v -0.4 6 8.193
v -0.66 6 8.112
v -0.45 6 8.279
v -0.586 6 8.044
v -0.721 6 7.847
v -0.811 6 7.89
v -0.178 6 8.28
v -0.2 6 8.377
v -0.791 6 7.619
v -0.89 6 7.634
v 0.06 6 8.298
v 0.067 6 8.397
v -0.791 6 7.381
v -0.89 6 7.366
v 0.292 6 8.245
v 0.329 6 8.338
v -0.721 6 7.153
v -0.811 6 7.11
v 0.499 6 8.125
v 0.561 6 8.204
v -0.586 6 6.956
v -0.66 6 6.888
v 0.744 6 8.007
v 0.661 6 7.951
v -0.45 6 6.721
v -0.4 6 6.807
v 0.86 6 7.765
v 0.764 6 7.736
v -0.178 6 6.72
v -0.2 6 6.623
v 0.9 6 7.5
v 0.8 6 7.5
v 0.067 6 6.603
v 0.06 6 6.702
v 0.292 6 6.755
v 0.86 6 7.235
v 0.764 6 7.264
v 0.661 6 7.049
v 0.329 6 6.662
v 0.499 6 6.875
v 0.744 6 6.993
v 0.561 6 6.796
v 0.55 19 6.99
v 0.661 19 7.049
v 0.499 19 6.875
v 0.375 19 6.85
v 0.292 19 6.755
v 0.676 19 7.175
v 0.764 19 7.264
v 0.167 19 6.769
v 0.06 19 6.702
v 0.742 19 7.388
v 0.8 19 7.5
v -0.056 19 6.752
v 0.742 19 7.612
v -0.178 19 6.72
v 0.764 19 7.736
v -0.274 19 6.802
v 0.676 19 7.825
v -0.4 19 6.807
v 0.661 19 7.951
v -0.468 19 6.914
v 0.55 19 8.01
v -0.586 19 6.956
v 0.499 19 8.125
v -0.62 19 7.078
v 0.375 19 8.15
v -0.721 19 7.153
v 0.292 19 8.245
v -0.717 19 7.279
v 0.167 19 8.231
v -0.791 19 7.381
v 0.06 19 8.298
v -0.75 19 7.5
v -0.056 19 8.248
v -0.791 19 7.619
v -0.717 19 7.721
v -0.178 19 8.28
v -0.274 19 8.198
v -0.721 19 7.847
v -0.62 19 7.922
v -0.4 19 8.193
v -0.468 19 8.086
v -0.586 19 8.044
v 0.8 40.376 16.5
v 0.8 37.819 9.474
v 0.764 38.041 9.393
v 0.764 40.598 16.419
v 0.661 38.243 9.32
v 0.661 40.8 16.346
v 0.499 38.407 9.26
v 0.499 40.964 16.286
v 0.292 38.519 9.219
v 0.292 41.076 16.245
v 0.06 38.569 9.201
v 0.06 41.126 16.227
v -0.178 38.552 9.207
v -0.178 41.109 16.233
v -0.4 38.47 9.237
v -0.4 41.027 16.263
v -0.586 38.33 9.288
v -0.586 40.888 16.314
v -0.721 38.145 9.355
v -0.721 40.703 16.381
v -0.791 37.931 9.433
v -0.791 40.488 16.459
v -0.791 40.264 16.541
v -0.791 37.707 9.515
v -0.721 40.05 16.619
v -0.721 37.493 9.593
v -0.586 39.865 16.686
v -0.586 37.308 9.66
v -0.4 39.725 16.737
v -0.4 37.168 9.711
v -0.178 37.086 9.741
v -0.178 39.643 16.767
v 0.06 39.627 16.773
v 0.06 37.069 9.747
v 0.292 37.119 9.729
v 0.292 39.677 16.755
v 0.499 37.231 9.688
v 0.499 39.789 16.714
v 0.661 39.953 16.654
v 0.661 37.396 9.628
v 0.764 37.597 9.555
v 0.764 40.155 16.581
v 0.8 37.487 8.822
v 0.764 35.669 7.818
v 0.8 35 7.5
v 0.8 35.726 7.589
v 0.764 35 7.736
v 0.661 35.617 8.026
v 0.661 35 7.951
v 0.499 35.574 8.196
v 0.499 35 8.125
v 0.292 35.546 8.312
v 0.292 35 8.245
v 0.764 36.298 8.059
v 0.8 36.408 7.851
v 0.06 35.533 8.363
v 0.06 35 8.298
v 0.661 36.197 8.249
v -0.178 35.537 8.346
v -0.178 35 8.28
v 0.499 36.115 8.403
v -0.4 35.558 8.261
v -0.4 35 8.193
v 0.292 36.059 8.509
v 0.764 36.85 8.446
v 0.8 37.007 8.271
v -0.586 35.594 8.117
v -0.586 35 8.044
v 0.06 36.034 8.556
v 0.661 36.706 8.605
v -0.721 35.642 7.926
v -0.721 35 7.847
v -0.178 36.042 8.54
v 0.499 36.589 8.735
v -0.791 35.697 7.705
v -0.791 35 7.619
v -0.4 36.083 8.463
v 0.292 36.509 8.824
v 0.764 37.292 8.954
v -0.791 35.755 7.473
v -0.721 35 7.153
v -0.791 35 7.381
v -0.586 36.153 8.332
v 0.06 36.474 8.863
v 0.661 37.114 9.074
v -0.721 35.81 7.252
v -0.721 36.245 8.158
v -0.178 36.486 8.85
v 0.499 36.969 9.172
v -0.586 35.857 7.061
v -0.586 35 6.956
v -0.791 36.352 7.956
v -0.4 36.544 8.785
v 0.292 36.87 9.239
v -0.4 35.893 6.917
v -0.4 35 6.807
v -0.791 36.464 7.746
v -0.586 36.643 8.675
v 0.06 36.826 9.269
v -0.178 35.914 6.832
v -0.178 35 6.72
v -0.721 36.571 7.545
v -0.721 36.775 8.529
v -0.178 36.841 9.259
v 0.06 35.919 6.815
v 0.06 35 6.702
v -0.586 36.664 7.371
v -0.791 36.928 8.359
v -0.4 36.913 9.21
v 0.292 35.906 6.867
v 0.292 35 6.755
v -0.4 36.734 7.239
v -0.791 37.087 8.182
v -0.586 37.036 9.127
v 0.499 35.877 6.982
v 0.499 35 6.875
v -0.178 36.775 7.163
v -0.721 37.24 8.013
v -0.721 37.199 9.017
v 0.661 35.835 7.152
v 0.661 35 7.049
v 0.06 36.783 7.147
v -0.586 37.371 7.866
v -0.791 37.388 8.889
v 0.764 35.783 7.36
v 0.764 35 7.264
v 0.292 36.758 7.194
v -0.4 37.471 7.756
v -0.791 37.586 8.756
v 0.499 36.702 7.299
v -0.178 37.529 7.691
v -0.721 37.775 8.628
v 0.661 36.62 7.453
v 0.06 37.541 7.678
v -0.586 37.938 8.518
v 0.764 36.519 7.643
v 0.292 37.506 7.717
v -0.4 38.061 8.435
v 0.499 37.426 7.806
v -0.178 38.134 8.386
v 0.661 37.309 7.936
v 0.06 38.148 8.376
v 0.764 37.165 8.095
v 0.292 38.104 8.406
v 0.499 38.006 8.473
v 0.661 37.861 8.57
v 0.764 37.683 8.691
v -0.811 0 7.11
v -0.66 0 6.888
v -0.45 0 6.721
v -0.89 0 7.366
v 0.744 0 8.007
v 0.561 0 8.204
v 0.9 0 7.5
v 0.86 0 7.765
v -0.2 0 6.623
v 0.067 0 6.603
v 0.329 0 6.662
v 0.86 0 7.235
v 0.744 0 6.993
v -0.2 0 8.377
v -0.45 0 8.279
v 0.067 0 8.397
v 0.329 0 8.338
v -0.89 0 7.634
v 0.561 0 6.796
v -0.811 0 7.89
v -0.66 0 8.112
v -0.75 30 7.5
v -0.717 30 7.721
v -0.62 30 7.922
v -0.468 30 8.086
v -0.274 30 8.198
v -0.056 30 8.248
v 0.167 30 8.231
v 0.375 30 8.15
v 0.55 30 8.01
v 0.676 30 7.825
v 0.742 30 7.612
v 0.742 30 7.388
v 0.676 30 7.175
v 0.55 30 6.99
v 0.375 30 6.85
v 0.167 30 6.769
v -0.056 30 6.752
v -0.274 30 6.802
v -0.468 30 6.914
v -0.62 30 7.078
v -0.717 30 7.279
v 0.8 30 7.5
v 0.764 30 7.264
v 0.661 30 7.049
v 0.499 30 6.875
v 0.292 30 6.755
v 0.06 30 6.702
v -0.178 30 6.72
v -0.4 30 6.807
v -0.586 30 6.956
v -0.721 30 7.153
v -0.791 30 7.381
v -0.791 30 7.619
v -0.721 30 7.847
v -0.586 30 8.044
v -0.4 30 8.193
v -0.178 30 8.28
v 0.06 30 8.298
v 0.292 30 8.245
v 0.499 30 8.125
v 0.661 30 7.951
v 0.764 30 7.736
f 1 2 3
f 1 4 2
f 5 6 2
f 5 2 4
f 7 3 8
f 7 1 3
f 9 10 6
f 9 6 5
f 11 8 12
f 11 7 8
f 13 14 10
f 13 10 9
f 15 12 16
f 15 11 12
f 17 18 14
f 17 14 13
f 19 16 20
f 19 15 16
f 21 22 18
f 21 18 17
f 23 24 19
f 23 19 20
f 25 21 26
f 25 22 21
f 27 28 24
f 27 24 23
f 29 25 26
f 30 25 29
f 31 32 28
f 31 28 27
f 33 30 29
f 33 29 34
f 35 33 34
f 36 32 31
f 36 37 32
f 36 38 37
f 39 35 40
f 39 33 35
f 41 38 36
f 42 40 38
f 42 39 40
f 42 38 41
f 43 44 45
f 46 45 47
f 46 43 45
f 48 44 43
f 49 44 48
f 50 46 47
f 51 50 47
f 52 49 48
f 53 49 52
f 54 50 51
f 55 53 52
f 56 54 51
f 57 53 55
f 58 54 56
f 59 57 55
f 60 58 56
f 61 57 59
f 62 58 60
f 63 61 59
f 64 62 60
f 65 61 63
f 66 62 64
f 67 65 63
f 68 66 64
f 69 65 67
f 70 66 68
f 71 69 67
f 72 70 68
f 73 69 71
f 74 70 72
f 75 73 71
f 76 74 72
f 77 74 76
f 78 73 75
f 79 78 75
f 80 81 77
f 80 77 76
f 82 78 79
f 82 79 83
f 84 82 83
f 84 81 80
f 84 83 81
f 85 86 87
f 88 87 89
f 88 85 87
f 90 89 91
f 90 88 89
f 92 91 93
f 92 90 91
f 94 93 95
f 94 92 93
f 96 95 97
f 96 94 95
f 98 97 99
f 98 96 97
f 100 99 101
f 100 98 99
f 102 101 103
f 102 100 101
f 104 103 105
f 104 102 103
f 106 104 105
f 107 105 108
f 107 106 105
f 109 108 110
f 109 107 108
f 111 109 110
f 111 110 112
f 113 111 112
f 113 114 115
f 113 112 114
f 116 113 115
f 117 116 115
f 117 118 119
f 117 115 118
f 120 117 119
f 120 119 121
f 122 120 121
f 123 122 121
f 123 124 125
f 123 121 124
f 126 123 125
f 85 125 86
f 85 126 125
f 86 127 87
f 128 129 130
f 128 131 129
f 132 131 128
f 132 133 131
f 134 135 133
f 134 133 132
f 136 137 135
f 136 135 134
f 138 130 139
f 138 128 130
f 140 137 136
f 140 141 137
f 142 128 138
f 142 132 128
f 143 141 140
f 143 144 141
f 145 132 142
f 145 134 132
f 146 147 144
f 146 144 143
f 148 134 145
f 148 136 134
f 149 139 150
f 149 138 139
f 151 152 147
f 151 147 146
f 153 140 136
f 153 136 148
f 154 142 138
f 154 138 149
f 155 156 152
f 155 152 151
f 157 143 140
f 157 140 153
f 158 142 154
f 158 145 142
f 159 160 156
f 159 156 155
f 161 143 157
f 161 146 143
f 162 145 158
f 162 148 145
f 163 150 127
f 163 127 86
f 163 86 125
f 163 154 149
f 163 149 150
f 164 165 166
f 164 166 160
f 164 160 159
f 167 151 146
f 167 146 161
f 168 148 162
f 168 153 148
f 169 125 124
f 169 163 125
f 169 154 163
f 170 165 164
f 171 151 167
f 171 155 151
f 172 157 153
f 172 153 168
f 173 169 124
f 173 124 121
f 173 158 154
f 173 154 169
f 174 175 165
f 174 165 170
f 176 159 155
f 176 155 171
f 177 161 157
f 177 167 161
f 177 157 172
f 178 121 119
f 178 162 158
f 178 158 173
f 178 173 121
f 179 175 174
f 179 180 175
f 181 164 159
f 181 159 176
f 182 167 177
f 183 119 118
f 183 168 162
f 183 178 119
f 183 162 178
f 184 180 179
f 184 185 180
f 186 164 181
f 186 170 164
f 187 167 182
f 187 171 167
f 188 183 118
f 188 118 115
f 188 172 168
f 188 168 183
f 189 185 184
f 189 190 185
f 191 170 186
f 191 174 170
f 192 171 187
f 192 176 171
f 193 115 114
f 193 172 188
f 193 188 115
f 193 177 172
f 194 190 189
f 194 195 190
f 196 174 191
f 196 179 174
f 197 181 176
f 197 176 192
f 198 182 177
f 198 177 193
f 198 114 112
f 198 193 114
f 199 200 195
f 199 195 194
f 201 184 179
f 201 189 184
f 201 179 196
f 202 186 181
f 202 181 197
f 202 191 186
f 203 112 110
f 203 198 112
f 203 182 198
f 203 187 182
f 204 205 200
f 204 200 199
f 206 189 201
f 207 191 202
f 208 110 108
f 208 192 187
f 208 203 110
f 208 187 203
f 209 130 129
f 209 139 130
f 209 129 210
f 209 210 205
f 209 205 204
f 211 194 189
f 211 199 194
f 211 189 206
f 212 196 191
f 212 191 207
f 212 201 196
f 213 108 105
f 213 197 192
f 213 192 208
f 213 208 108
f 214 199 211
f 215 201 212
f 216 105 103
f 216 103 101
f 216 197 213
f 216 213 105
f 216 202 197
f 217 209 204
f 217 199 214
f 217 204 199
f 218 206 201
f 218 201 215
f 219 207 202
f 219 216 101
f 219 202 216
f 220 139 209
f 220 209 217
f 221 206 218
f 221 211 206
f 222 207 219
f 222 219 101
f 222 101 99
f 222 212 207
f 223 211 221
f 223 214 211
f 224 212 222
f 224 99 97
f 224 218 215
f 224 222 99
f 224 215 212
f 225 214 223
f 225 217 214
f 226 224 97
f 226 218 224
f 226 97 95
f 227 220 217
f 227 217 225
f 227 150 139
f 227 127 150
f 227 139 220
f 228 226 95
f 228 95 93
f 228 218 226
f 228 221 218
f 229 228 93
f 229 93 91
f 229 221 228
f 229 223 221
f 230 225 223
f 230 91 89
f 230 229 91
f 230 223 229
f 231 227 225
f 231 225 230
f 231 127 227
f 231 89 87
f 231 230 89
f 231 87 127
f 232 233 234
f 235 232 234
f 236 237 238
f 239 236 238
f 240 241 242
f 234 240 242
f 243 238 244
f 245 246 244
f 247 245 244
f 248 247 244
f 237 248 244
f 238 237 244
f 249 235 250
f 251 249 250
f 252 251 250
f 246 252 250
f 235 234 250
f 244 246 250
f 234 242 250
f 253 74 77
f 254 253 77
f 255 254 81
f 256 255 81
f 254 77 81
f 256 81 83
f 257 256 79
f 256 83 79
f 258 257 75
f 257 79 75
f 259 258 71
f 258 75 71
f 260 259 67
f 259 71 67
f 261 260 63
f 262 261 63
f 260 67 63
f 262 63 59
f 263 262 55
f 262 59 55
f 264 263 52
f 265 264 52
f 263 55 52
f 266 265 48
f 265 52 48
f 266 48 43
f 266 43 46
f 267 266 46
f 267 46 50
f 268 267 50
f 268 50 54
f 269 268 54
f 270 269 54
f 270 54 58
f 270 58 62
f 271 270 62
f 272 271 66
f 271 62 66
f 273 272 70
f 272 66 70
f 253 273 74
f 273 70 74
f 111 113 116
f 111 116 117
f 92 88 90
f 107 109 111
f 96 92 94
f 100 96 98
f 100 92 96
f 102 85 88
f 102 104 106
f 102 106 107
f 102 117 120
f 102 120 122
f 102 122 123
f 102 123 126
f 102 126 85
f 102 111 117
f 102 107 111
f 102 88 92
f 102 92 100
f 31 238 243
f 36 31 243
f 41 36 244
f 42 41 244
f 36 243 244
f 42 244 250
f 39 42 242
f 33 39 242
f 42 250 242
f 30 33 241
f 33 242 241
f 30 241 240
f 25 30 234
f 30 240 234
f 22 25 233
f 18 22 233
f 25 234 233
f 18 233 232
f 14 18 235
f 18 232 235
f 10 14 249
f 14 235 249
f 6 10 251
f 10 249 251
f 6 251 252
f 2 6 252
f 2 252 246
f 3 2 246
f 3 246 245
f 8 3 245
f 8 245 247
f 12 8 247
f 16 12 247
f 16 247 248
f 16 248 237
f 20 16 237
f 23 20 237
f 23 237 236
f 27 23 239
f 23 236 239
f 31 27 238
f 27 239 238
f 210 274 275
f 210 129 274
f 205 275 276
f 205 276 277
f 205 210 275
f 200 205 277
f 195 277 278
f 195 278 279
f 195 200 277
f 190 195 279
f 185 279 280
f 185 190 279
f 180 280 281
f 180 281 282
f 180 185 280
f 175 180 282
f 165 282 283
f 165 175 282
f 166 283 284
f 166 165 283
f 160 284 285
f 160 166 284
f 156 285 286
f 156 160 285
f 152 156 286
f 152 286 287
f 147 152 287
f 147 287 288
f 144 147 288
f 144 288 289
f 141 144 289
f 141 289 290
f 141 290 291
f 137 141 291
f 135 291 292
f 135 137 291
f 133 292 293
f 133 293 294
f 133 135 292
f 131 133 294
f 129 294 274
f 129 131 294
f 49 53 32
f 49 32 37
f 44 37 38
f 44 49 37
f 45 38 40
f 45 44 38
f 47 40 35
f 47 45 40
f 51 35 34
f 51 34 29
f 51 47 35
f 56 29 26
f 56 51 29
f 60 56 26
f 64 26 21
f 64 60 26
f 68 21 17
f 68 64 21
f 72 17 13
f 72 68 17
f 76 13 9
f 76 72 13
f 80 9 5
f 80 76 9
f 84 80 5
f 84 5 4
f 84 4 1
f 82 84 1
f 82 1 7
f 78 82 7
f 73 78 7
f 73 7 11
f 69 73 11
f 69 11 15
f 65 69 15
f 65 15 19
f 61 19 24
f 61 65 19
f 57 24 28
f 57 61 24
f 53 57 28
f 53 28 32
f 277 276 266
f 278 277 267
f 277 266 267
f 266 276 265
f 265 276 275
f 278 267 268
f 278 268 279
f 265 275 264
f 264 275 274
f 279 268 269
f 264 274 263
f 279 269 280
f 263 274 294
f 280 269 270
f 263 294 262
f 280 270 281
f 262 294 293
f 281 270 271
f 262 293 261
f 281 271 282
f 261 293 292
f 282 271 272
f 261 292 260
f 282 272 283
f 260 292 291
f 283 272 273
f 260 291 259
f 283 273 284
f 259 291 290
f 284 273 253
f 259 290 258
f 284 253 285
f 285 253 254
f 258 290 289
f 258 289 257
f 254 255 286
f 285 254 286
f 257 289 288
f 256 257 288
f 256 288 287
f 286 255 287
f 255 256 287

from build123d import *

# Parameters (mm, degrees)
SKETCH2_R         = 0.8
SKETCH4_R         = 0.9
EXTRUDE1_DEPTH    = 6
SKETCH5_OUTSIDE_W = 12.282
SKETCH5_OUTSIDE_H = 20.656
SKETCH5_OUTSIDE_R = 0.75
EXTRUDE3_DEPTH    = 11


with BuildPart() as part:
    # Sweep1: sweep along a path in Sketch1
    with BuildLine(Plane(origin=(0, 0, 0), x_dir=(0, 0, -1), z_dir=(1, 0, 0))) as sweep1_path:
        Line((-7.5, 0), (-7.5, 35))
        ThreePointArc((-7.5, 35), (-8.042543867, 36.720729309), (-9.47393957, 37.819077862))
        Line((-9.47393957, 37.819077862), (-16.5, 40.376354723))
    # Sketch2 → Sweep1 (sweep)
    with BuildSketch(Plane(origin=(0, 0, 0), x_dir=(1, 0, 0), z_dir=(0, 1, 0))):
        with Locations((0, -7.5)):
            Circle(SKETCH2_R)
    sweep(path=sweep1_path.line)

    # Sketch4 → Extrude1 (add)
    with BuildSketch(Plane(origin=(0, 0, 0), x_dir=(1, 0, 0), z_dir=(0, 1, 0))):
        with Locations((0, -7.5)):
            Circle(SKETCH4_R)
    extrude(amount=EXTRUDE1_DEPTH)

    # Sketch5 outside → Extrude3 (cut)
    with BuildSketch(Plane(origin=(0, 19, 0), x_dir=(-1, 0, 0), z_dir=(0, 1, 0))):
        with Locations((0, 11.687)):
            Rectangle(SKETCH5_OUTSIDE_W, SKETCH5_OUTSIDE_H)
        with Locations((0, 7.5)):
            Circle(SKETCH5_OUTSIDE_R, mode=Mode.SUBTRACT)
    extrude(amount=EXTRUDE3_DEPTH, mode=Mode.SUBTRACT)


solid = part.part
